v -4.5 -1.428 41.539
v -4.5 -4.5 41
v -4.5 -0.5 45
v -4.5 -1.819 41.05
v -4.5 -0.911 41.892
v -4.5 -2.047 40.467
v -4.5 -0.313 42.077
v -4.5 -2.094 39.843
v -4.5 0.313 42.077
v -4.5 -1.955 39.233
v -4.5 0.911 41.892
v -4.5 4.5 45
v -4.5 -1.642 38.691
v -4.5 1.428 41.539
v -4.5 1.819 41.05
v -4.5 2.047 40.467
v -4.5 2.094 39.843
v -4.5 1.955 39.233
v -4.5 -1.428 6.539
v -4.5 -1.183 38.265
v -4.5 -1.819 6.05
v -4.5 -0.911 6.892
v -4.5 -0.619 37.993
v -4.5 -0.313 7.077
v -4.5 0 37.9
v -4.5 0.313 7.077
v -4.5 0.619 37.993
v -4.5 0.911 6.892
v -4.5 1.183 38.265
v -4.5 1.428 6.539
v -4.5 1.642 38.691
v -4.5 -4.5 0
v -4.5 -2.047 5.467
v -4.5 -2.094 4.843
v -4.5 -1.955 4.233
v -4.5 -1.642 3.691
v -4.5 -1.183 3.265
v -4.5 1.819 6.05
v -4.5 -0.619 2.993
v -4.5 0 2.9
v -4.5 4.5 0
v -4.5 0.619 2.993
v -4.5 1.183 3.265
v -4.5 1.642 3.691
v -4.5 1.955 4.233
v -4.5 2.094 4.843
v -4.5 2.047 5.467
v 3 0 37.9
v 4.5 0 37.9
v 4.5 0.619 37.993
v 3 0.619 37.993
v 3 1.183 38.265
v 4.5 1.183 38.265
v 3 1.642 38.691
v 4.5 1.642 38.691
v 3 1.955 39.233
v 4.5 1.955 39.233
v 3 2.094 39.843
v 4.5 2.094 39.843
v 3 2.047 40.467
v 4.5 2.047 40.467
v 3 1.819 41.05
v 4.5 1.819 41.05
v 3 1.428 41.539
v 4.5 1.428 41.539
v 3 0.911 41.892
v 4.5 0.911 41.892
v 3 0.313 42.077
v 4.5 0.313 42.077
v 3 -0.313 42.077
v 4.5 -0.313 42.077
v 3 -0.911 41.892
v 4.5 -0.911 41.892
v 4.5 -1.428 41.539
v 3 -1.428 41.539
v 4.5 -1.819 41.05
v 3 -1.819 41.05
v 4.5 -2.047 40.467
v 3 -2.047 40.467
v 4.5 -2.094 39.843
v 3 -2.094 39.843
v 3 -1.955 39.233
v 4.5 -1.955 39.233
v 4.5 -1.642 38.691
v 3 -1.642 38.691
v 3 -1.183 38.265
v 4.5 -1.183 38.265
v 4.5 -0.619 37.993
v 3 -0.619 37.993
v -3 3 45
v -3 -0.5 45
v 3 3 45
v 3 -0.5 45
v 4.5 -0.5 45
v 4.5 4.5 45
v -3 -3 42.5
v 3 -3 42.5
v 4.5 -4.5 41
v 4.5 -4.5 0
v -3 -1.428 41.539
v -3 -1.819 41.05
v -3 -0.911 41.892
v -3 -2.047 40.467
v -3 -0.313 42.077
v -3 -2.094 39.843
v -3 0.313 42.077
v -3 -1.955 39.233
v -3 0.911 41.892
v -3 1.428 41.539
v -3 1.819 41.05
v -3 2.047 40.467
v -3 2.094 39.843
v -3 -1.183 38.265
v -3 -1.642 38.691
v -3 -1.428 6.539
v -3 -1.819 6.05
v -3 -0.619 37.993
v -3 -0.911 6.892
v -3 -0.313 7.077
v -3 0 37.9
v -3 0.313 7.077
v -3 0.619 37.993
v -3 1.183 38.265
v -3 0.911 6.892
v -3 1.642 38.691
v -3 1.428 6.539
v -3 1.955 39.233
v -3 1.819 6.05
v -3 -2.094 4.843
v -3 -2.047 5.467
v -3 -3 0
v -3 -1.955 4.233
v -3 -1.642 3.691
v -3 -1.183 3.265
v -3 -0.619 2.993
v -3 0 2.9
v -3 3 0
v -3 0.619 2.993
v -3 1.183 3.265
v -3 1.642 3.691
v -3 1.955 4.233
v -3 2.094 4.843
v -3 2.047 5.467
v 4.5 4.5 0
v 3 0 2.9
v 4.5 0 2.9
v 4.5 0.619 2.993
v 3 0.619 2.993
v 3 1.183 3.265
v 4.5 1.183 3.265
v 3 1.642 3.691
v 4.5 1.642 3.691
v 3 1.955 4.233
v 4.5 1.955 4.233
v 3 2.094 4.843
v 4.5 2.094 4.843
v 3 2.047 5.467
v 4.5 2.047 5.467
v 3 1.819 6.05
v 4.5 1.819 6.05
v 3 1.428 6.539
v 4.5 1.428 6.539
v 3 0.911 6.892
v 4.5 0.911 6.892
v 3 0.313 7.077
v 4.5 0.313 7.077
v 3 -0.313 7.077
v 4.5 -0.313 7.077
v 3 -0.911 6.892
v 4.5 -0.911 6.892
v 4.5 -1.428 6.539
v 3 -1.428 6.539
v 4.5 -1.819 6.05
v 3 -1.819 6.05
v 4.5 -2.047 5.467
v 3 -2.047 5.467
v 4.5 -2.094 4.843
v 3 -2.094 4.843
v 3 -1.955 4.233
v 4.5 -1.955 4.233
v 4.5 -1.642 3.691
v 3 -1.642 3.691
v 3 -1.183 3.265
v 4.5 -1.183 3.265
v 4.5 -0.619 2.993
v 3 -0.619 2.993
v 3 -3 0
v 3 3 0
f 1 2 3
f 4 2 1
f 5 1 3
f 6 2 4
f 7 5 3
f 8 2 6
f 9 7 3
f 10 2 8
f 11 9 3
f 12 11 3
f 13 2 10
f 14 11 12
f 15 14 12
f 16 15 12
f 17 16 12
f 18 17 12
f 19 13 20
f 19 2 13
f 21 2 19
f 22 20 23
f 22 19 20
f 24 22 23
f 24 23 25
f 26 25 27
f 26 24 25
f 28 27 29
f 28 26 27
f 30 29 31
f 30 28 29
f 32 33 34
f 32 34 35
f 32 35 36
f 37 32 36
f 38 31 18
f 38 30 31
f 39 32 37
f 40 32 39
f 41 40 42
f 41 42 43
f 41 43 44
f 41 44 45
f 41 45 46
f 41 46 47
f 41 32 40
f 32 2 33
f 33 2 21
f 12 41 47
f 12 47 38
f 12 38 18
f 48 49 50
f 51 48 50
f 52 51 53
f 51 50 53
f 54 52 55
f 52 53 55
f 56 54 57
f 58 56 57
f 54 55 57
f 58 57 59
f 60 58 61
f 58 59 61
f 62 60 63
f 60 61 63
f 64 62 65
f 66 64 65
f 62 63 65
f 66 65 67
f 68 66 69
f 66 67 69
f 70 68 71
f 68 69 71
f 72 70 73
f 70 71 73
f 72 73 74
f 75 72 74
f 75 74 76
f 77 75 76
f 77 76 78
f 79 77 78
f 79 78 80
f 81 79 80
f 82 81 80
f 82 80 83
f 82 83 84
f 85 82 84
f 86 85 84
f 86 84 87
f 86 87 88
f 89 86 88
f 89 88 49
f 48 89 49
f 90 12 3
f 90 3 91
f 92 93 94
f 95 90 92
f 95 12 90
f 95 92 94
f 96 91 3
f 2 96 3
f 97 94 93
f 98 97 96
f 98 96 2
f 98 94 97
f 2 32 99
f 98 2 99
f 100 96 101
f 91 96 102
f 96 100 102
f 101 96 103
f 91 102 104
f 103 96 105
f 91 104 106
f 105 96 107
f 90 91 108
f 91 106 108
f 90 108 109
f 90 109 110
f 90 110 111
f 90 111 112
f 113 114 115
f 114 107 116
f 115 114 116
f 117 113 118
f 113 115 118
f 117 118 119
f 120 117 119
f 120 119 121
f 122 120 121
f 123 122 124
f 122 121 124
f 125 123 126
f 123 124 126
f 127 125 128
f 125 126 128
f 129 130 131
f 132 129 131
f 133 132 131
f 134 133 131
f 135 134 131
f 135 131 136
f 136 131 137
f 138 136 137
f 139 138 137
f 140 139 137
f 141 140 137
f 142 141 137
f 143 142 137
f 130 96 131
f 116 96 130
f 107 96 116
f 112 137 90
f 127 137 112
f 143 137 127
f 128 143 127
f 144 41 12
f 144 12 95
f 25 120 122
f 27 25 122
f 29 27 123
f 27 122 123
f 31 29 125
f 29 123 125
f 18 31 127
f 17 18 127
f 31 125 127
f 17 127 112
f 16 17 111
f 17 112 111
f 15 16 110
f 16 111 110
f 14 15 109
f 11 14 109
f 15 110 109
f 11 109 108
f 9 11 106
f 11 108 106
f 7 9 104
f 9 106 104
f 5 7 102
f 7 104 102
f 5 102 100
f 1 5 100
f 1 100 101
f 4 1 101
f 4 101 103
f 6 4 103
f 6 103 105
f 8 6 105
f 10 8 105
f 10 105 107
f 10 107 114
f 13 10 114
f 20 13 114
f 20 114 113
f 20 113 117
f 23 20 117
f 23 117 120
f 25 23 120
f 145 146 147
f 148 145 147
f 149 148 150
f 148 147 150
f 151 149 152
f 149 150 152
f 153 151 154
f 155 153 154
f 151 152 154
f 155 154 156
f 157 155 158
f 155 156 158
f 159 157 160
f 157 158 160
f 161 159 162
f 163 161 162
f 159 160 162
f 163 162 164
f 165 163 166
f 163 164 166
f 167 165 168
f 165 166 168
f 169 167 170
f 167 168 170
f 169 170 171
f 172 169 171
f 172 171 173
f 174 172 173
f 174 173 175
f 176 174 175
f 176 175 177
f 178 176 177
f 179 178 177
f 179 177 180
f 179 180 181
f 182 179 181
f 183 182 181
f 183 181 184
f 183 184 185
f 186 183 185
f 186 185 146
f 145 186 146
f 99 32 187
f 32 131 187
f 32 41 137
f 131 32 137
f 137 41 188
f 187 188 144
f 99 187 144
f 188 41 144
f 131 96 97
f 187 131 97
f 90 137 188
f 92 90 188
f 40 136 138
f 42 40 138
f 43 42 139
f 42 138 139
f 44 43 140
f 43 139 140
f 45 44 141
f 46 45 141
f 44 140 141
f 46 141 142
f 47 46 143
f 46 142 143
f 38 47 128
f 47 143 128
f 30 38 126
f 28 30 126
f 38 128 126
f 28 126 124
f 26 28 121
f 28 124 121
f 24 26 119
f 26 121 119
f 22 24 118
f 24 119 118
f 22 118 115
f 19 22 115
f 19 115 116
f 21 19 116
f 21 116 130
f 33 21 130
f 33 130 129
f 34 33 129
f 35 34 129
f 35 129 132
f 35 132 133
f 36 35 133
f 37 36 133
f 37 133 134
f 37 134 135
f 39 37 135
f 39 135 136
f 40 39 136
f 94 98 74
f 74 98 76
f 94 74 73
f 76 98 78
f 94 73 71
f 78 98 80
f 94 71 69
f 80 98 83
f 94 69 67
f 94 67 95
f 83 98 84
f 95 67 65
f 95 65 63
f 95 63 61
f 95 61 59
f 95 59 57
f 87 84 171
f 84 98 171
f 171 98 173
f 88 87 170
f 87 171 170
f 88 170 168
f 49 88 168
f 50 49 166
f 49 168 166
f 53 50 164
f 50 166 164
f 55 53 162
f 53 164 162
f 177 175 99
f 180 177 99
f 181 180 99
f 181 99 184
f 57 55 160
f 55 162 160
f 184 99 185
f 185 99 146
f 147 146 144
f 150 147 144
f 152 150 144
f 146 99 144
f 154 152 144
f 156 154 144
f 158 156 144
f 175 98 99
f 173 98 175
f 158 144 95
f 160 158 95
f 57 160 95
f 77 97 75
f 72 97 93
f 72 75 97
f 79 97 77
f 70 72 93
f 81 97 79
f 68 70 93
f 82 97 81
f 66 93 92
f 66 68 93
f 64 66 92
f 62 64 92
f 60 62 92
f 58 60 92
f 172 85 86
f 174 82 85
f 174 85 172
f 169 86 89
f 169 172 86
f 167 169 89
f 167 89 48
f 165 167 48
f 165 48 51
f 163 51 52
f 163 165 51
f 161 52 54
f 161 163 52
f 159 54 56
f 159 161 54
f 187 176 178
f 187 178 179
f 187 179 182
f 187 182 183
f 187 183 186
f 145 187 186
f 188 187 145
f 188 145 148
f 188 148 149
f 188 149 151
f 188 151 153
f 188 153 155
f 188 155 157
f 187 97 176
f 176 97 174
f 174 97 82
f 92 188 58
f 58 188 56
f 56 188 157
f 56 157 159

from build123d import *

# Parameters (mm, degrees)
SKETCH_1_W          = 9
SKETCH_1_H          = 9
SKETCH_1_W_2        = 6
SKETCH_1_H_2        = 6
EXTRUDE_1_DEPTH     = 45
SKETCH_2_R          = 2.1
CUT_EXTRUDE_1_DEPTH = 30
CUT_EXTRUDE_3_DEPTH = 10


with BuildPart() as part:
    # ｽｹｯﾁ1 → ﾎﾞｽ - 押し出し1 (new body)
    with BuildSketch(Plane.XY):
        Rectangle(SKETCH_1_W, SKETCH_1_H)
        Rectangle(SKETCH_1_W_2, SKETCH_1_H_2, mode=Mode.SUBTRACT)
    extrude(amount=EXTRUDE_1_DEPTH)

    # ｽｹｯﾁ2 → ｶｯﾄ - 押し出し1 (cut)
    with BuildSketch(Plane(origin=(4.5, 0, 0), x_dir=(0, 0, -1), z_dir=(1, 0, 0))):
        with Locations((-40, 0)):
            Circle(SKETCH_2_R)
        with Locations((-5, 0)):
            Circle(SKETCH_2_R)
    extrude(amount=-CUT_EXTRUDE_1_DEPTH, mode=Mode.SUBTRACT)

    # ｽｹｯﾁ3 → ｶｯﾄ - 押し出し3 (cut)
    with BuildSketch(Plane(origin=(4.5, 0, 0), x_dir=(0, 0, -1), z_dir=(1, 0, 0))):
        Polygon((-45, -4.5), (-45, -0.5), (-41, -4.5), align=None)
    extrude(amount=-CUT_EXTRUDE_3_DEPTH, mode=Mode.SUBTRACT)


solid = part.part
